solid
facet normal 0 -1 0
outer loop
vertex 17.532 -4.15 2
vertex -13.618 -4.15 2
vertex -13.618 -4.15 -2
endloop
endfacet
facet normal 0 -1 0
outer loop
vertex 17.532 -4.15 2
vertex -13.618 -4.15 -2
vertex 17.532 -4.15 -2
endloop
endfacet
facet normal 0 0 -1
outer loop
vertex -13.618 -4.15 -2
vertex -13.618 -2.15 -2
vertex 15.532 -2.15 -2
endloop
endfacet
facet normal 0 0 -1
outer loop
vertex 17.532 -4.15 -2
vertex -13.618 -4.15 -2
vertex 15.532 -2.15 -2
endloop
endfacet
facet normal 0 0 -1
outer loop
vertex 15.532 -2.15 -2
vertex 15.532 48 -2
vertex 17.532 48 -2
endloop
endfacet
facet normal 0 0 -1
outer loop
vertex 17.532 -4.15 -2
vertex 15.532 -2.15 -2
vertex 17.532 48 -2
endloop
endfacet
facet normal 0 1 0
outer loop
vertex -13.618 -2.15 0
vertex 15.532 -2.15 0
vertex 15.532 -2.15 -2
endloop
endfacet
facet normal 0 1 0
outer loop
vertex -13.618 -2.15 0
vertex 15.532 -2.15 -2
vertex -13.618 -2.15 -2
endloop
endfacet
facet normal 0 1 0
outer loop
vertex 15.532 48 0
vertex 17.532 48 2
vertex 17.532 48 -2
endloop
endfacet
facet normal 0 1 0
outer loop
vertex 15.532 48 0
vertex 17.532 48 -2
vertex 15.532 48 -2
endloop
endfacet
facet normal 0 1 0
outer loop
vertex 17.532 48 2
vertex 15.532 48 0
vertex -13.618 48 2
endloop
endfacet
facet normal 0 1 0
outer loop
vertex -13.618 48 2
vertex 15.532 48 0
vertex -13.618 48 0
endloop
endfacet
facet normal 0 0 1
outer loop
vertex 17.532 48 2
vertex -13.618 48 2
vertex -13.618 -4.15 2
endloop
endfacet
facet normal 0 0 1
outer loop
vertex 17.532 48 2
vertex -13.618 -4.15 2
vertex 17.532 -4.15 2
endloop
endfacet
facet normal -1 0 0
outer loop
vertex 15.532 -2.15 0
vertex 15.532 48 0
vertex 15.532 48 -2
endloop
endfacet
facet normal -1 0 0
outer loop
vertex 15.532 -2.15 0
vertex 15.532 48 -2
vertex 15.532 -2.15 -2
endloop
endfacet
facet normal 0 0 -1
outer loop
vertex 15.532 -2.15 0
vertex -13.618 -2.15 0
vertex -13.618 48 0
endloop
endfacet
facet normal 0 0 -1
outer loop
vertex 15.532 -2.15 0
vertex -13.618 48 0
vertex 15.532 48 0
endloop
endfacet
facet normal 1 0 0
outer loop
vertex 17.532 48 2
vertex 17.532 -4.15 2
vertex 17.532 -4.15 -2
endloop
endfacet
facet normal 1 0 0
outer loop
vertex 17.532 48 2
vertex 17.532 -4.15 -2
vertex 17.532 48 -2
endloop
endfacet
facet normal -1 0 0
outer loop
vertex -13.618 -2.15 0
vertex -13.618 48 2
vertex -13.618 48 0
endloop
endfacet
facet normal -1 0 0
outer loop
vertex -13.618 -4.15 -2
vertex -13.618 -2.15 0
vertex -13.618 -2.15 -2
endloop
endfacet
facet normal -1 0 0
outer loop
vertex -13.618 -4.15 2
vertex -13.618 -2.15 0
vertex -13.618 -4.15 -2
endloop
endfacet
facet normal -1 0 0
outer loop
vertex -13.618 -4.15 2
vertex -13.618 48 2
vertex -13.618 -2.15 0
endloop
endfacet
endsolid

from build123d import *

# Parameters (mm, degrees)
SKETCH2_W           = 31.15
SKETCH2_H           = 52.15
BOSS_EXTRUDE1_DEPTH = 2
BOSS_EXTRUDE2_DEPTH = 2


with BuildPart() as part:
    # Sketch2 → Boss-Extrude1 (new body)
    with BuildSketch(Plane.XY):
        with Locations((1.956924198, 21.925)):
            Rectangle(SKETCH2_W, SKETCH2_H)
    extrude(amount=BOSS_EXTRUDE1_DEPTH)

    # Sketch2<4> → Boss-Extrude2 (add)
    with BuildSketch(Plane.XY):
        Polygon((17.531924198, 48), (15.531924198, 48), (15.531924198, -2.15), (-13.618075802, -2.15), (-13.618075802, -4.15), (17.531924198, -4.15), align=None)
    extrude(amount=-BOSS_EXTRUDE2_DEPTH)


solid = part.part
